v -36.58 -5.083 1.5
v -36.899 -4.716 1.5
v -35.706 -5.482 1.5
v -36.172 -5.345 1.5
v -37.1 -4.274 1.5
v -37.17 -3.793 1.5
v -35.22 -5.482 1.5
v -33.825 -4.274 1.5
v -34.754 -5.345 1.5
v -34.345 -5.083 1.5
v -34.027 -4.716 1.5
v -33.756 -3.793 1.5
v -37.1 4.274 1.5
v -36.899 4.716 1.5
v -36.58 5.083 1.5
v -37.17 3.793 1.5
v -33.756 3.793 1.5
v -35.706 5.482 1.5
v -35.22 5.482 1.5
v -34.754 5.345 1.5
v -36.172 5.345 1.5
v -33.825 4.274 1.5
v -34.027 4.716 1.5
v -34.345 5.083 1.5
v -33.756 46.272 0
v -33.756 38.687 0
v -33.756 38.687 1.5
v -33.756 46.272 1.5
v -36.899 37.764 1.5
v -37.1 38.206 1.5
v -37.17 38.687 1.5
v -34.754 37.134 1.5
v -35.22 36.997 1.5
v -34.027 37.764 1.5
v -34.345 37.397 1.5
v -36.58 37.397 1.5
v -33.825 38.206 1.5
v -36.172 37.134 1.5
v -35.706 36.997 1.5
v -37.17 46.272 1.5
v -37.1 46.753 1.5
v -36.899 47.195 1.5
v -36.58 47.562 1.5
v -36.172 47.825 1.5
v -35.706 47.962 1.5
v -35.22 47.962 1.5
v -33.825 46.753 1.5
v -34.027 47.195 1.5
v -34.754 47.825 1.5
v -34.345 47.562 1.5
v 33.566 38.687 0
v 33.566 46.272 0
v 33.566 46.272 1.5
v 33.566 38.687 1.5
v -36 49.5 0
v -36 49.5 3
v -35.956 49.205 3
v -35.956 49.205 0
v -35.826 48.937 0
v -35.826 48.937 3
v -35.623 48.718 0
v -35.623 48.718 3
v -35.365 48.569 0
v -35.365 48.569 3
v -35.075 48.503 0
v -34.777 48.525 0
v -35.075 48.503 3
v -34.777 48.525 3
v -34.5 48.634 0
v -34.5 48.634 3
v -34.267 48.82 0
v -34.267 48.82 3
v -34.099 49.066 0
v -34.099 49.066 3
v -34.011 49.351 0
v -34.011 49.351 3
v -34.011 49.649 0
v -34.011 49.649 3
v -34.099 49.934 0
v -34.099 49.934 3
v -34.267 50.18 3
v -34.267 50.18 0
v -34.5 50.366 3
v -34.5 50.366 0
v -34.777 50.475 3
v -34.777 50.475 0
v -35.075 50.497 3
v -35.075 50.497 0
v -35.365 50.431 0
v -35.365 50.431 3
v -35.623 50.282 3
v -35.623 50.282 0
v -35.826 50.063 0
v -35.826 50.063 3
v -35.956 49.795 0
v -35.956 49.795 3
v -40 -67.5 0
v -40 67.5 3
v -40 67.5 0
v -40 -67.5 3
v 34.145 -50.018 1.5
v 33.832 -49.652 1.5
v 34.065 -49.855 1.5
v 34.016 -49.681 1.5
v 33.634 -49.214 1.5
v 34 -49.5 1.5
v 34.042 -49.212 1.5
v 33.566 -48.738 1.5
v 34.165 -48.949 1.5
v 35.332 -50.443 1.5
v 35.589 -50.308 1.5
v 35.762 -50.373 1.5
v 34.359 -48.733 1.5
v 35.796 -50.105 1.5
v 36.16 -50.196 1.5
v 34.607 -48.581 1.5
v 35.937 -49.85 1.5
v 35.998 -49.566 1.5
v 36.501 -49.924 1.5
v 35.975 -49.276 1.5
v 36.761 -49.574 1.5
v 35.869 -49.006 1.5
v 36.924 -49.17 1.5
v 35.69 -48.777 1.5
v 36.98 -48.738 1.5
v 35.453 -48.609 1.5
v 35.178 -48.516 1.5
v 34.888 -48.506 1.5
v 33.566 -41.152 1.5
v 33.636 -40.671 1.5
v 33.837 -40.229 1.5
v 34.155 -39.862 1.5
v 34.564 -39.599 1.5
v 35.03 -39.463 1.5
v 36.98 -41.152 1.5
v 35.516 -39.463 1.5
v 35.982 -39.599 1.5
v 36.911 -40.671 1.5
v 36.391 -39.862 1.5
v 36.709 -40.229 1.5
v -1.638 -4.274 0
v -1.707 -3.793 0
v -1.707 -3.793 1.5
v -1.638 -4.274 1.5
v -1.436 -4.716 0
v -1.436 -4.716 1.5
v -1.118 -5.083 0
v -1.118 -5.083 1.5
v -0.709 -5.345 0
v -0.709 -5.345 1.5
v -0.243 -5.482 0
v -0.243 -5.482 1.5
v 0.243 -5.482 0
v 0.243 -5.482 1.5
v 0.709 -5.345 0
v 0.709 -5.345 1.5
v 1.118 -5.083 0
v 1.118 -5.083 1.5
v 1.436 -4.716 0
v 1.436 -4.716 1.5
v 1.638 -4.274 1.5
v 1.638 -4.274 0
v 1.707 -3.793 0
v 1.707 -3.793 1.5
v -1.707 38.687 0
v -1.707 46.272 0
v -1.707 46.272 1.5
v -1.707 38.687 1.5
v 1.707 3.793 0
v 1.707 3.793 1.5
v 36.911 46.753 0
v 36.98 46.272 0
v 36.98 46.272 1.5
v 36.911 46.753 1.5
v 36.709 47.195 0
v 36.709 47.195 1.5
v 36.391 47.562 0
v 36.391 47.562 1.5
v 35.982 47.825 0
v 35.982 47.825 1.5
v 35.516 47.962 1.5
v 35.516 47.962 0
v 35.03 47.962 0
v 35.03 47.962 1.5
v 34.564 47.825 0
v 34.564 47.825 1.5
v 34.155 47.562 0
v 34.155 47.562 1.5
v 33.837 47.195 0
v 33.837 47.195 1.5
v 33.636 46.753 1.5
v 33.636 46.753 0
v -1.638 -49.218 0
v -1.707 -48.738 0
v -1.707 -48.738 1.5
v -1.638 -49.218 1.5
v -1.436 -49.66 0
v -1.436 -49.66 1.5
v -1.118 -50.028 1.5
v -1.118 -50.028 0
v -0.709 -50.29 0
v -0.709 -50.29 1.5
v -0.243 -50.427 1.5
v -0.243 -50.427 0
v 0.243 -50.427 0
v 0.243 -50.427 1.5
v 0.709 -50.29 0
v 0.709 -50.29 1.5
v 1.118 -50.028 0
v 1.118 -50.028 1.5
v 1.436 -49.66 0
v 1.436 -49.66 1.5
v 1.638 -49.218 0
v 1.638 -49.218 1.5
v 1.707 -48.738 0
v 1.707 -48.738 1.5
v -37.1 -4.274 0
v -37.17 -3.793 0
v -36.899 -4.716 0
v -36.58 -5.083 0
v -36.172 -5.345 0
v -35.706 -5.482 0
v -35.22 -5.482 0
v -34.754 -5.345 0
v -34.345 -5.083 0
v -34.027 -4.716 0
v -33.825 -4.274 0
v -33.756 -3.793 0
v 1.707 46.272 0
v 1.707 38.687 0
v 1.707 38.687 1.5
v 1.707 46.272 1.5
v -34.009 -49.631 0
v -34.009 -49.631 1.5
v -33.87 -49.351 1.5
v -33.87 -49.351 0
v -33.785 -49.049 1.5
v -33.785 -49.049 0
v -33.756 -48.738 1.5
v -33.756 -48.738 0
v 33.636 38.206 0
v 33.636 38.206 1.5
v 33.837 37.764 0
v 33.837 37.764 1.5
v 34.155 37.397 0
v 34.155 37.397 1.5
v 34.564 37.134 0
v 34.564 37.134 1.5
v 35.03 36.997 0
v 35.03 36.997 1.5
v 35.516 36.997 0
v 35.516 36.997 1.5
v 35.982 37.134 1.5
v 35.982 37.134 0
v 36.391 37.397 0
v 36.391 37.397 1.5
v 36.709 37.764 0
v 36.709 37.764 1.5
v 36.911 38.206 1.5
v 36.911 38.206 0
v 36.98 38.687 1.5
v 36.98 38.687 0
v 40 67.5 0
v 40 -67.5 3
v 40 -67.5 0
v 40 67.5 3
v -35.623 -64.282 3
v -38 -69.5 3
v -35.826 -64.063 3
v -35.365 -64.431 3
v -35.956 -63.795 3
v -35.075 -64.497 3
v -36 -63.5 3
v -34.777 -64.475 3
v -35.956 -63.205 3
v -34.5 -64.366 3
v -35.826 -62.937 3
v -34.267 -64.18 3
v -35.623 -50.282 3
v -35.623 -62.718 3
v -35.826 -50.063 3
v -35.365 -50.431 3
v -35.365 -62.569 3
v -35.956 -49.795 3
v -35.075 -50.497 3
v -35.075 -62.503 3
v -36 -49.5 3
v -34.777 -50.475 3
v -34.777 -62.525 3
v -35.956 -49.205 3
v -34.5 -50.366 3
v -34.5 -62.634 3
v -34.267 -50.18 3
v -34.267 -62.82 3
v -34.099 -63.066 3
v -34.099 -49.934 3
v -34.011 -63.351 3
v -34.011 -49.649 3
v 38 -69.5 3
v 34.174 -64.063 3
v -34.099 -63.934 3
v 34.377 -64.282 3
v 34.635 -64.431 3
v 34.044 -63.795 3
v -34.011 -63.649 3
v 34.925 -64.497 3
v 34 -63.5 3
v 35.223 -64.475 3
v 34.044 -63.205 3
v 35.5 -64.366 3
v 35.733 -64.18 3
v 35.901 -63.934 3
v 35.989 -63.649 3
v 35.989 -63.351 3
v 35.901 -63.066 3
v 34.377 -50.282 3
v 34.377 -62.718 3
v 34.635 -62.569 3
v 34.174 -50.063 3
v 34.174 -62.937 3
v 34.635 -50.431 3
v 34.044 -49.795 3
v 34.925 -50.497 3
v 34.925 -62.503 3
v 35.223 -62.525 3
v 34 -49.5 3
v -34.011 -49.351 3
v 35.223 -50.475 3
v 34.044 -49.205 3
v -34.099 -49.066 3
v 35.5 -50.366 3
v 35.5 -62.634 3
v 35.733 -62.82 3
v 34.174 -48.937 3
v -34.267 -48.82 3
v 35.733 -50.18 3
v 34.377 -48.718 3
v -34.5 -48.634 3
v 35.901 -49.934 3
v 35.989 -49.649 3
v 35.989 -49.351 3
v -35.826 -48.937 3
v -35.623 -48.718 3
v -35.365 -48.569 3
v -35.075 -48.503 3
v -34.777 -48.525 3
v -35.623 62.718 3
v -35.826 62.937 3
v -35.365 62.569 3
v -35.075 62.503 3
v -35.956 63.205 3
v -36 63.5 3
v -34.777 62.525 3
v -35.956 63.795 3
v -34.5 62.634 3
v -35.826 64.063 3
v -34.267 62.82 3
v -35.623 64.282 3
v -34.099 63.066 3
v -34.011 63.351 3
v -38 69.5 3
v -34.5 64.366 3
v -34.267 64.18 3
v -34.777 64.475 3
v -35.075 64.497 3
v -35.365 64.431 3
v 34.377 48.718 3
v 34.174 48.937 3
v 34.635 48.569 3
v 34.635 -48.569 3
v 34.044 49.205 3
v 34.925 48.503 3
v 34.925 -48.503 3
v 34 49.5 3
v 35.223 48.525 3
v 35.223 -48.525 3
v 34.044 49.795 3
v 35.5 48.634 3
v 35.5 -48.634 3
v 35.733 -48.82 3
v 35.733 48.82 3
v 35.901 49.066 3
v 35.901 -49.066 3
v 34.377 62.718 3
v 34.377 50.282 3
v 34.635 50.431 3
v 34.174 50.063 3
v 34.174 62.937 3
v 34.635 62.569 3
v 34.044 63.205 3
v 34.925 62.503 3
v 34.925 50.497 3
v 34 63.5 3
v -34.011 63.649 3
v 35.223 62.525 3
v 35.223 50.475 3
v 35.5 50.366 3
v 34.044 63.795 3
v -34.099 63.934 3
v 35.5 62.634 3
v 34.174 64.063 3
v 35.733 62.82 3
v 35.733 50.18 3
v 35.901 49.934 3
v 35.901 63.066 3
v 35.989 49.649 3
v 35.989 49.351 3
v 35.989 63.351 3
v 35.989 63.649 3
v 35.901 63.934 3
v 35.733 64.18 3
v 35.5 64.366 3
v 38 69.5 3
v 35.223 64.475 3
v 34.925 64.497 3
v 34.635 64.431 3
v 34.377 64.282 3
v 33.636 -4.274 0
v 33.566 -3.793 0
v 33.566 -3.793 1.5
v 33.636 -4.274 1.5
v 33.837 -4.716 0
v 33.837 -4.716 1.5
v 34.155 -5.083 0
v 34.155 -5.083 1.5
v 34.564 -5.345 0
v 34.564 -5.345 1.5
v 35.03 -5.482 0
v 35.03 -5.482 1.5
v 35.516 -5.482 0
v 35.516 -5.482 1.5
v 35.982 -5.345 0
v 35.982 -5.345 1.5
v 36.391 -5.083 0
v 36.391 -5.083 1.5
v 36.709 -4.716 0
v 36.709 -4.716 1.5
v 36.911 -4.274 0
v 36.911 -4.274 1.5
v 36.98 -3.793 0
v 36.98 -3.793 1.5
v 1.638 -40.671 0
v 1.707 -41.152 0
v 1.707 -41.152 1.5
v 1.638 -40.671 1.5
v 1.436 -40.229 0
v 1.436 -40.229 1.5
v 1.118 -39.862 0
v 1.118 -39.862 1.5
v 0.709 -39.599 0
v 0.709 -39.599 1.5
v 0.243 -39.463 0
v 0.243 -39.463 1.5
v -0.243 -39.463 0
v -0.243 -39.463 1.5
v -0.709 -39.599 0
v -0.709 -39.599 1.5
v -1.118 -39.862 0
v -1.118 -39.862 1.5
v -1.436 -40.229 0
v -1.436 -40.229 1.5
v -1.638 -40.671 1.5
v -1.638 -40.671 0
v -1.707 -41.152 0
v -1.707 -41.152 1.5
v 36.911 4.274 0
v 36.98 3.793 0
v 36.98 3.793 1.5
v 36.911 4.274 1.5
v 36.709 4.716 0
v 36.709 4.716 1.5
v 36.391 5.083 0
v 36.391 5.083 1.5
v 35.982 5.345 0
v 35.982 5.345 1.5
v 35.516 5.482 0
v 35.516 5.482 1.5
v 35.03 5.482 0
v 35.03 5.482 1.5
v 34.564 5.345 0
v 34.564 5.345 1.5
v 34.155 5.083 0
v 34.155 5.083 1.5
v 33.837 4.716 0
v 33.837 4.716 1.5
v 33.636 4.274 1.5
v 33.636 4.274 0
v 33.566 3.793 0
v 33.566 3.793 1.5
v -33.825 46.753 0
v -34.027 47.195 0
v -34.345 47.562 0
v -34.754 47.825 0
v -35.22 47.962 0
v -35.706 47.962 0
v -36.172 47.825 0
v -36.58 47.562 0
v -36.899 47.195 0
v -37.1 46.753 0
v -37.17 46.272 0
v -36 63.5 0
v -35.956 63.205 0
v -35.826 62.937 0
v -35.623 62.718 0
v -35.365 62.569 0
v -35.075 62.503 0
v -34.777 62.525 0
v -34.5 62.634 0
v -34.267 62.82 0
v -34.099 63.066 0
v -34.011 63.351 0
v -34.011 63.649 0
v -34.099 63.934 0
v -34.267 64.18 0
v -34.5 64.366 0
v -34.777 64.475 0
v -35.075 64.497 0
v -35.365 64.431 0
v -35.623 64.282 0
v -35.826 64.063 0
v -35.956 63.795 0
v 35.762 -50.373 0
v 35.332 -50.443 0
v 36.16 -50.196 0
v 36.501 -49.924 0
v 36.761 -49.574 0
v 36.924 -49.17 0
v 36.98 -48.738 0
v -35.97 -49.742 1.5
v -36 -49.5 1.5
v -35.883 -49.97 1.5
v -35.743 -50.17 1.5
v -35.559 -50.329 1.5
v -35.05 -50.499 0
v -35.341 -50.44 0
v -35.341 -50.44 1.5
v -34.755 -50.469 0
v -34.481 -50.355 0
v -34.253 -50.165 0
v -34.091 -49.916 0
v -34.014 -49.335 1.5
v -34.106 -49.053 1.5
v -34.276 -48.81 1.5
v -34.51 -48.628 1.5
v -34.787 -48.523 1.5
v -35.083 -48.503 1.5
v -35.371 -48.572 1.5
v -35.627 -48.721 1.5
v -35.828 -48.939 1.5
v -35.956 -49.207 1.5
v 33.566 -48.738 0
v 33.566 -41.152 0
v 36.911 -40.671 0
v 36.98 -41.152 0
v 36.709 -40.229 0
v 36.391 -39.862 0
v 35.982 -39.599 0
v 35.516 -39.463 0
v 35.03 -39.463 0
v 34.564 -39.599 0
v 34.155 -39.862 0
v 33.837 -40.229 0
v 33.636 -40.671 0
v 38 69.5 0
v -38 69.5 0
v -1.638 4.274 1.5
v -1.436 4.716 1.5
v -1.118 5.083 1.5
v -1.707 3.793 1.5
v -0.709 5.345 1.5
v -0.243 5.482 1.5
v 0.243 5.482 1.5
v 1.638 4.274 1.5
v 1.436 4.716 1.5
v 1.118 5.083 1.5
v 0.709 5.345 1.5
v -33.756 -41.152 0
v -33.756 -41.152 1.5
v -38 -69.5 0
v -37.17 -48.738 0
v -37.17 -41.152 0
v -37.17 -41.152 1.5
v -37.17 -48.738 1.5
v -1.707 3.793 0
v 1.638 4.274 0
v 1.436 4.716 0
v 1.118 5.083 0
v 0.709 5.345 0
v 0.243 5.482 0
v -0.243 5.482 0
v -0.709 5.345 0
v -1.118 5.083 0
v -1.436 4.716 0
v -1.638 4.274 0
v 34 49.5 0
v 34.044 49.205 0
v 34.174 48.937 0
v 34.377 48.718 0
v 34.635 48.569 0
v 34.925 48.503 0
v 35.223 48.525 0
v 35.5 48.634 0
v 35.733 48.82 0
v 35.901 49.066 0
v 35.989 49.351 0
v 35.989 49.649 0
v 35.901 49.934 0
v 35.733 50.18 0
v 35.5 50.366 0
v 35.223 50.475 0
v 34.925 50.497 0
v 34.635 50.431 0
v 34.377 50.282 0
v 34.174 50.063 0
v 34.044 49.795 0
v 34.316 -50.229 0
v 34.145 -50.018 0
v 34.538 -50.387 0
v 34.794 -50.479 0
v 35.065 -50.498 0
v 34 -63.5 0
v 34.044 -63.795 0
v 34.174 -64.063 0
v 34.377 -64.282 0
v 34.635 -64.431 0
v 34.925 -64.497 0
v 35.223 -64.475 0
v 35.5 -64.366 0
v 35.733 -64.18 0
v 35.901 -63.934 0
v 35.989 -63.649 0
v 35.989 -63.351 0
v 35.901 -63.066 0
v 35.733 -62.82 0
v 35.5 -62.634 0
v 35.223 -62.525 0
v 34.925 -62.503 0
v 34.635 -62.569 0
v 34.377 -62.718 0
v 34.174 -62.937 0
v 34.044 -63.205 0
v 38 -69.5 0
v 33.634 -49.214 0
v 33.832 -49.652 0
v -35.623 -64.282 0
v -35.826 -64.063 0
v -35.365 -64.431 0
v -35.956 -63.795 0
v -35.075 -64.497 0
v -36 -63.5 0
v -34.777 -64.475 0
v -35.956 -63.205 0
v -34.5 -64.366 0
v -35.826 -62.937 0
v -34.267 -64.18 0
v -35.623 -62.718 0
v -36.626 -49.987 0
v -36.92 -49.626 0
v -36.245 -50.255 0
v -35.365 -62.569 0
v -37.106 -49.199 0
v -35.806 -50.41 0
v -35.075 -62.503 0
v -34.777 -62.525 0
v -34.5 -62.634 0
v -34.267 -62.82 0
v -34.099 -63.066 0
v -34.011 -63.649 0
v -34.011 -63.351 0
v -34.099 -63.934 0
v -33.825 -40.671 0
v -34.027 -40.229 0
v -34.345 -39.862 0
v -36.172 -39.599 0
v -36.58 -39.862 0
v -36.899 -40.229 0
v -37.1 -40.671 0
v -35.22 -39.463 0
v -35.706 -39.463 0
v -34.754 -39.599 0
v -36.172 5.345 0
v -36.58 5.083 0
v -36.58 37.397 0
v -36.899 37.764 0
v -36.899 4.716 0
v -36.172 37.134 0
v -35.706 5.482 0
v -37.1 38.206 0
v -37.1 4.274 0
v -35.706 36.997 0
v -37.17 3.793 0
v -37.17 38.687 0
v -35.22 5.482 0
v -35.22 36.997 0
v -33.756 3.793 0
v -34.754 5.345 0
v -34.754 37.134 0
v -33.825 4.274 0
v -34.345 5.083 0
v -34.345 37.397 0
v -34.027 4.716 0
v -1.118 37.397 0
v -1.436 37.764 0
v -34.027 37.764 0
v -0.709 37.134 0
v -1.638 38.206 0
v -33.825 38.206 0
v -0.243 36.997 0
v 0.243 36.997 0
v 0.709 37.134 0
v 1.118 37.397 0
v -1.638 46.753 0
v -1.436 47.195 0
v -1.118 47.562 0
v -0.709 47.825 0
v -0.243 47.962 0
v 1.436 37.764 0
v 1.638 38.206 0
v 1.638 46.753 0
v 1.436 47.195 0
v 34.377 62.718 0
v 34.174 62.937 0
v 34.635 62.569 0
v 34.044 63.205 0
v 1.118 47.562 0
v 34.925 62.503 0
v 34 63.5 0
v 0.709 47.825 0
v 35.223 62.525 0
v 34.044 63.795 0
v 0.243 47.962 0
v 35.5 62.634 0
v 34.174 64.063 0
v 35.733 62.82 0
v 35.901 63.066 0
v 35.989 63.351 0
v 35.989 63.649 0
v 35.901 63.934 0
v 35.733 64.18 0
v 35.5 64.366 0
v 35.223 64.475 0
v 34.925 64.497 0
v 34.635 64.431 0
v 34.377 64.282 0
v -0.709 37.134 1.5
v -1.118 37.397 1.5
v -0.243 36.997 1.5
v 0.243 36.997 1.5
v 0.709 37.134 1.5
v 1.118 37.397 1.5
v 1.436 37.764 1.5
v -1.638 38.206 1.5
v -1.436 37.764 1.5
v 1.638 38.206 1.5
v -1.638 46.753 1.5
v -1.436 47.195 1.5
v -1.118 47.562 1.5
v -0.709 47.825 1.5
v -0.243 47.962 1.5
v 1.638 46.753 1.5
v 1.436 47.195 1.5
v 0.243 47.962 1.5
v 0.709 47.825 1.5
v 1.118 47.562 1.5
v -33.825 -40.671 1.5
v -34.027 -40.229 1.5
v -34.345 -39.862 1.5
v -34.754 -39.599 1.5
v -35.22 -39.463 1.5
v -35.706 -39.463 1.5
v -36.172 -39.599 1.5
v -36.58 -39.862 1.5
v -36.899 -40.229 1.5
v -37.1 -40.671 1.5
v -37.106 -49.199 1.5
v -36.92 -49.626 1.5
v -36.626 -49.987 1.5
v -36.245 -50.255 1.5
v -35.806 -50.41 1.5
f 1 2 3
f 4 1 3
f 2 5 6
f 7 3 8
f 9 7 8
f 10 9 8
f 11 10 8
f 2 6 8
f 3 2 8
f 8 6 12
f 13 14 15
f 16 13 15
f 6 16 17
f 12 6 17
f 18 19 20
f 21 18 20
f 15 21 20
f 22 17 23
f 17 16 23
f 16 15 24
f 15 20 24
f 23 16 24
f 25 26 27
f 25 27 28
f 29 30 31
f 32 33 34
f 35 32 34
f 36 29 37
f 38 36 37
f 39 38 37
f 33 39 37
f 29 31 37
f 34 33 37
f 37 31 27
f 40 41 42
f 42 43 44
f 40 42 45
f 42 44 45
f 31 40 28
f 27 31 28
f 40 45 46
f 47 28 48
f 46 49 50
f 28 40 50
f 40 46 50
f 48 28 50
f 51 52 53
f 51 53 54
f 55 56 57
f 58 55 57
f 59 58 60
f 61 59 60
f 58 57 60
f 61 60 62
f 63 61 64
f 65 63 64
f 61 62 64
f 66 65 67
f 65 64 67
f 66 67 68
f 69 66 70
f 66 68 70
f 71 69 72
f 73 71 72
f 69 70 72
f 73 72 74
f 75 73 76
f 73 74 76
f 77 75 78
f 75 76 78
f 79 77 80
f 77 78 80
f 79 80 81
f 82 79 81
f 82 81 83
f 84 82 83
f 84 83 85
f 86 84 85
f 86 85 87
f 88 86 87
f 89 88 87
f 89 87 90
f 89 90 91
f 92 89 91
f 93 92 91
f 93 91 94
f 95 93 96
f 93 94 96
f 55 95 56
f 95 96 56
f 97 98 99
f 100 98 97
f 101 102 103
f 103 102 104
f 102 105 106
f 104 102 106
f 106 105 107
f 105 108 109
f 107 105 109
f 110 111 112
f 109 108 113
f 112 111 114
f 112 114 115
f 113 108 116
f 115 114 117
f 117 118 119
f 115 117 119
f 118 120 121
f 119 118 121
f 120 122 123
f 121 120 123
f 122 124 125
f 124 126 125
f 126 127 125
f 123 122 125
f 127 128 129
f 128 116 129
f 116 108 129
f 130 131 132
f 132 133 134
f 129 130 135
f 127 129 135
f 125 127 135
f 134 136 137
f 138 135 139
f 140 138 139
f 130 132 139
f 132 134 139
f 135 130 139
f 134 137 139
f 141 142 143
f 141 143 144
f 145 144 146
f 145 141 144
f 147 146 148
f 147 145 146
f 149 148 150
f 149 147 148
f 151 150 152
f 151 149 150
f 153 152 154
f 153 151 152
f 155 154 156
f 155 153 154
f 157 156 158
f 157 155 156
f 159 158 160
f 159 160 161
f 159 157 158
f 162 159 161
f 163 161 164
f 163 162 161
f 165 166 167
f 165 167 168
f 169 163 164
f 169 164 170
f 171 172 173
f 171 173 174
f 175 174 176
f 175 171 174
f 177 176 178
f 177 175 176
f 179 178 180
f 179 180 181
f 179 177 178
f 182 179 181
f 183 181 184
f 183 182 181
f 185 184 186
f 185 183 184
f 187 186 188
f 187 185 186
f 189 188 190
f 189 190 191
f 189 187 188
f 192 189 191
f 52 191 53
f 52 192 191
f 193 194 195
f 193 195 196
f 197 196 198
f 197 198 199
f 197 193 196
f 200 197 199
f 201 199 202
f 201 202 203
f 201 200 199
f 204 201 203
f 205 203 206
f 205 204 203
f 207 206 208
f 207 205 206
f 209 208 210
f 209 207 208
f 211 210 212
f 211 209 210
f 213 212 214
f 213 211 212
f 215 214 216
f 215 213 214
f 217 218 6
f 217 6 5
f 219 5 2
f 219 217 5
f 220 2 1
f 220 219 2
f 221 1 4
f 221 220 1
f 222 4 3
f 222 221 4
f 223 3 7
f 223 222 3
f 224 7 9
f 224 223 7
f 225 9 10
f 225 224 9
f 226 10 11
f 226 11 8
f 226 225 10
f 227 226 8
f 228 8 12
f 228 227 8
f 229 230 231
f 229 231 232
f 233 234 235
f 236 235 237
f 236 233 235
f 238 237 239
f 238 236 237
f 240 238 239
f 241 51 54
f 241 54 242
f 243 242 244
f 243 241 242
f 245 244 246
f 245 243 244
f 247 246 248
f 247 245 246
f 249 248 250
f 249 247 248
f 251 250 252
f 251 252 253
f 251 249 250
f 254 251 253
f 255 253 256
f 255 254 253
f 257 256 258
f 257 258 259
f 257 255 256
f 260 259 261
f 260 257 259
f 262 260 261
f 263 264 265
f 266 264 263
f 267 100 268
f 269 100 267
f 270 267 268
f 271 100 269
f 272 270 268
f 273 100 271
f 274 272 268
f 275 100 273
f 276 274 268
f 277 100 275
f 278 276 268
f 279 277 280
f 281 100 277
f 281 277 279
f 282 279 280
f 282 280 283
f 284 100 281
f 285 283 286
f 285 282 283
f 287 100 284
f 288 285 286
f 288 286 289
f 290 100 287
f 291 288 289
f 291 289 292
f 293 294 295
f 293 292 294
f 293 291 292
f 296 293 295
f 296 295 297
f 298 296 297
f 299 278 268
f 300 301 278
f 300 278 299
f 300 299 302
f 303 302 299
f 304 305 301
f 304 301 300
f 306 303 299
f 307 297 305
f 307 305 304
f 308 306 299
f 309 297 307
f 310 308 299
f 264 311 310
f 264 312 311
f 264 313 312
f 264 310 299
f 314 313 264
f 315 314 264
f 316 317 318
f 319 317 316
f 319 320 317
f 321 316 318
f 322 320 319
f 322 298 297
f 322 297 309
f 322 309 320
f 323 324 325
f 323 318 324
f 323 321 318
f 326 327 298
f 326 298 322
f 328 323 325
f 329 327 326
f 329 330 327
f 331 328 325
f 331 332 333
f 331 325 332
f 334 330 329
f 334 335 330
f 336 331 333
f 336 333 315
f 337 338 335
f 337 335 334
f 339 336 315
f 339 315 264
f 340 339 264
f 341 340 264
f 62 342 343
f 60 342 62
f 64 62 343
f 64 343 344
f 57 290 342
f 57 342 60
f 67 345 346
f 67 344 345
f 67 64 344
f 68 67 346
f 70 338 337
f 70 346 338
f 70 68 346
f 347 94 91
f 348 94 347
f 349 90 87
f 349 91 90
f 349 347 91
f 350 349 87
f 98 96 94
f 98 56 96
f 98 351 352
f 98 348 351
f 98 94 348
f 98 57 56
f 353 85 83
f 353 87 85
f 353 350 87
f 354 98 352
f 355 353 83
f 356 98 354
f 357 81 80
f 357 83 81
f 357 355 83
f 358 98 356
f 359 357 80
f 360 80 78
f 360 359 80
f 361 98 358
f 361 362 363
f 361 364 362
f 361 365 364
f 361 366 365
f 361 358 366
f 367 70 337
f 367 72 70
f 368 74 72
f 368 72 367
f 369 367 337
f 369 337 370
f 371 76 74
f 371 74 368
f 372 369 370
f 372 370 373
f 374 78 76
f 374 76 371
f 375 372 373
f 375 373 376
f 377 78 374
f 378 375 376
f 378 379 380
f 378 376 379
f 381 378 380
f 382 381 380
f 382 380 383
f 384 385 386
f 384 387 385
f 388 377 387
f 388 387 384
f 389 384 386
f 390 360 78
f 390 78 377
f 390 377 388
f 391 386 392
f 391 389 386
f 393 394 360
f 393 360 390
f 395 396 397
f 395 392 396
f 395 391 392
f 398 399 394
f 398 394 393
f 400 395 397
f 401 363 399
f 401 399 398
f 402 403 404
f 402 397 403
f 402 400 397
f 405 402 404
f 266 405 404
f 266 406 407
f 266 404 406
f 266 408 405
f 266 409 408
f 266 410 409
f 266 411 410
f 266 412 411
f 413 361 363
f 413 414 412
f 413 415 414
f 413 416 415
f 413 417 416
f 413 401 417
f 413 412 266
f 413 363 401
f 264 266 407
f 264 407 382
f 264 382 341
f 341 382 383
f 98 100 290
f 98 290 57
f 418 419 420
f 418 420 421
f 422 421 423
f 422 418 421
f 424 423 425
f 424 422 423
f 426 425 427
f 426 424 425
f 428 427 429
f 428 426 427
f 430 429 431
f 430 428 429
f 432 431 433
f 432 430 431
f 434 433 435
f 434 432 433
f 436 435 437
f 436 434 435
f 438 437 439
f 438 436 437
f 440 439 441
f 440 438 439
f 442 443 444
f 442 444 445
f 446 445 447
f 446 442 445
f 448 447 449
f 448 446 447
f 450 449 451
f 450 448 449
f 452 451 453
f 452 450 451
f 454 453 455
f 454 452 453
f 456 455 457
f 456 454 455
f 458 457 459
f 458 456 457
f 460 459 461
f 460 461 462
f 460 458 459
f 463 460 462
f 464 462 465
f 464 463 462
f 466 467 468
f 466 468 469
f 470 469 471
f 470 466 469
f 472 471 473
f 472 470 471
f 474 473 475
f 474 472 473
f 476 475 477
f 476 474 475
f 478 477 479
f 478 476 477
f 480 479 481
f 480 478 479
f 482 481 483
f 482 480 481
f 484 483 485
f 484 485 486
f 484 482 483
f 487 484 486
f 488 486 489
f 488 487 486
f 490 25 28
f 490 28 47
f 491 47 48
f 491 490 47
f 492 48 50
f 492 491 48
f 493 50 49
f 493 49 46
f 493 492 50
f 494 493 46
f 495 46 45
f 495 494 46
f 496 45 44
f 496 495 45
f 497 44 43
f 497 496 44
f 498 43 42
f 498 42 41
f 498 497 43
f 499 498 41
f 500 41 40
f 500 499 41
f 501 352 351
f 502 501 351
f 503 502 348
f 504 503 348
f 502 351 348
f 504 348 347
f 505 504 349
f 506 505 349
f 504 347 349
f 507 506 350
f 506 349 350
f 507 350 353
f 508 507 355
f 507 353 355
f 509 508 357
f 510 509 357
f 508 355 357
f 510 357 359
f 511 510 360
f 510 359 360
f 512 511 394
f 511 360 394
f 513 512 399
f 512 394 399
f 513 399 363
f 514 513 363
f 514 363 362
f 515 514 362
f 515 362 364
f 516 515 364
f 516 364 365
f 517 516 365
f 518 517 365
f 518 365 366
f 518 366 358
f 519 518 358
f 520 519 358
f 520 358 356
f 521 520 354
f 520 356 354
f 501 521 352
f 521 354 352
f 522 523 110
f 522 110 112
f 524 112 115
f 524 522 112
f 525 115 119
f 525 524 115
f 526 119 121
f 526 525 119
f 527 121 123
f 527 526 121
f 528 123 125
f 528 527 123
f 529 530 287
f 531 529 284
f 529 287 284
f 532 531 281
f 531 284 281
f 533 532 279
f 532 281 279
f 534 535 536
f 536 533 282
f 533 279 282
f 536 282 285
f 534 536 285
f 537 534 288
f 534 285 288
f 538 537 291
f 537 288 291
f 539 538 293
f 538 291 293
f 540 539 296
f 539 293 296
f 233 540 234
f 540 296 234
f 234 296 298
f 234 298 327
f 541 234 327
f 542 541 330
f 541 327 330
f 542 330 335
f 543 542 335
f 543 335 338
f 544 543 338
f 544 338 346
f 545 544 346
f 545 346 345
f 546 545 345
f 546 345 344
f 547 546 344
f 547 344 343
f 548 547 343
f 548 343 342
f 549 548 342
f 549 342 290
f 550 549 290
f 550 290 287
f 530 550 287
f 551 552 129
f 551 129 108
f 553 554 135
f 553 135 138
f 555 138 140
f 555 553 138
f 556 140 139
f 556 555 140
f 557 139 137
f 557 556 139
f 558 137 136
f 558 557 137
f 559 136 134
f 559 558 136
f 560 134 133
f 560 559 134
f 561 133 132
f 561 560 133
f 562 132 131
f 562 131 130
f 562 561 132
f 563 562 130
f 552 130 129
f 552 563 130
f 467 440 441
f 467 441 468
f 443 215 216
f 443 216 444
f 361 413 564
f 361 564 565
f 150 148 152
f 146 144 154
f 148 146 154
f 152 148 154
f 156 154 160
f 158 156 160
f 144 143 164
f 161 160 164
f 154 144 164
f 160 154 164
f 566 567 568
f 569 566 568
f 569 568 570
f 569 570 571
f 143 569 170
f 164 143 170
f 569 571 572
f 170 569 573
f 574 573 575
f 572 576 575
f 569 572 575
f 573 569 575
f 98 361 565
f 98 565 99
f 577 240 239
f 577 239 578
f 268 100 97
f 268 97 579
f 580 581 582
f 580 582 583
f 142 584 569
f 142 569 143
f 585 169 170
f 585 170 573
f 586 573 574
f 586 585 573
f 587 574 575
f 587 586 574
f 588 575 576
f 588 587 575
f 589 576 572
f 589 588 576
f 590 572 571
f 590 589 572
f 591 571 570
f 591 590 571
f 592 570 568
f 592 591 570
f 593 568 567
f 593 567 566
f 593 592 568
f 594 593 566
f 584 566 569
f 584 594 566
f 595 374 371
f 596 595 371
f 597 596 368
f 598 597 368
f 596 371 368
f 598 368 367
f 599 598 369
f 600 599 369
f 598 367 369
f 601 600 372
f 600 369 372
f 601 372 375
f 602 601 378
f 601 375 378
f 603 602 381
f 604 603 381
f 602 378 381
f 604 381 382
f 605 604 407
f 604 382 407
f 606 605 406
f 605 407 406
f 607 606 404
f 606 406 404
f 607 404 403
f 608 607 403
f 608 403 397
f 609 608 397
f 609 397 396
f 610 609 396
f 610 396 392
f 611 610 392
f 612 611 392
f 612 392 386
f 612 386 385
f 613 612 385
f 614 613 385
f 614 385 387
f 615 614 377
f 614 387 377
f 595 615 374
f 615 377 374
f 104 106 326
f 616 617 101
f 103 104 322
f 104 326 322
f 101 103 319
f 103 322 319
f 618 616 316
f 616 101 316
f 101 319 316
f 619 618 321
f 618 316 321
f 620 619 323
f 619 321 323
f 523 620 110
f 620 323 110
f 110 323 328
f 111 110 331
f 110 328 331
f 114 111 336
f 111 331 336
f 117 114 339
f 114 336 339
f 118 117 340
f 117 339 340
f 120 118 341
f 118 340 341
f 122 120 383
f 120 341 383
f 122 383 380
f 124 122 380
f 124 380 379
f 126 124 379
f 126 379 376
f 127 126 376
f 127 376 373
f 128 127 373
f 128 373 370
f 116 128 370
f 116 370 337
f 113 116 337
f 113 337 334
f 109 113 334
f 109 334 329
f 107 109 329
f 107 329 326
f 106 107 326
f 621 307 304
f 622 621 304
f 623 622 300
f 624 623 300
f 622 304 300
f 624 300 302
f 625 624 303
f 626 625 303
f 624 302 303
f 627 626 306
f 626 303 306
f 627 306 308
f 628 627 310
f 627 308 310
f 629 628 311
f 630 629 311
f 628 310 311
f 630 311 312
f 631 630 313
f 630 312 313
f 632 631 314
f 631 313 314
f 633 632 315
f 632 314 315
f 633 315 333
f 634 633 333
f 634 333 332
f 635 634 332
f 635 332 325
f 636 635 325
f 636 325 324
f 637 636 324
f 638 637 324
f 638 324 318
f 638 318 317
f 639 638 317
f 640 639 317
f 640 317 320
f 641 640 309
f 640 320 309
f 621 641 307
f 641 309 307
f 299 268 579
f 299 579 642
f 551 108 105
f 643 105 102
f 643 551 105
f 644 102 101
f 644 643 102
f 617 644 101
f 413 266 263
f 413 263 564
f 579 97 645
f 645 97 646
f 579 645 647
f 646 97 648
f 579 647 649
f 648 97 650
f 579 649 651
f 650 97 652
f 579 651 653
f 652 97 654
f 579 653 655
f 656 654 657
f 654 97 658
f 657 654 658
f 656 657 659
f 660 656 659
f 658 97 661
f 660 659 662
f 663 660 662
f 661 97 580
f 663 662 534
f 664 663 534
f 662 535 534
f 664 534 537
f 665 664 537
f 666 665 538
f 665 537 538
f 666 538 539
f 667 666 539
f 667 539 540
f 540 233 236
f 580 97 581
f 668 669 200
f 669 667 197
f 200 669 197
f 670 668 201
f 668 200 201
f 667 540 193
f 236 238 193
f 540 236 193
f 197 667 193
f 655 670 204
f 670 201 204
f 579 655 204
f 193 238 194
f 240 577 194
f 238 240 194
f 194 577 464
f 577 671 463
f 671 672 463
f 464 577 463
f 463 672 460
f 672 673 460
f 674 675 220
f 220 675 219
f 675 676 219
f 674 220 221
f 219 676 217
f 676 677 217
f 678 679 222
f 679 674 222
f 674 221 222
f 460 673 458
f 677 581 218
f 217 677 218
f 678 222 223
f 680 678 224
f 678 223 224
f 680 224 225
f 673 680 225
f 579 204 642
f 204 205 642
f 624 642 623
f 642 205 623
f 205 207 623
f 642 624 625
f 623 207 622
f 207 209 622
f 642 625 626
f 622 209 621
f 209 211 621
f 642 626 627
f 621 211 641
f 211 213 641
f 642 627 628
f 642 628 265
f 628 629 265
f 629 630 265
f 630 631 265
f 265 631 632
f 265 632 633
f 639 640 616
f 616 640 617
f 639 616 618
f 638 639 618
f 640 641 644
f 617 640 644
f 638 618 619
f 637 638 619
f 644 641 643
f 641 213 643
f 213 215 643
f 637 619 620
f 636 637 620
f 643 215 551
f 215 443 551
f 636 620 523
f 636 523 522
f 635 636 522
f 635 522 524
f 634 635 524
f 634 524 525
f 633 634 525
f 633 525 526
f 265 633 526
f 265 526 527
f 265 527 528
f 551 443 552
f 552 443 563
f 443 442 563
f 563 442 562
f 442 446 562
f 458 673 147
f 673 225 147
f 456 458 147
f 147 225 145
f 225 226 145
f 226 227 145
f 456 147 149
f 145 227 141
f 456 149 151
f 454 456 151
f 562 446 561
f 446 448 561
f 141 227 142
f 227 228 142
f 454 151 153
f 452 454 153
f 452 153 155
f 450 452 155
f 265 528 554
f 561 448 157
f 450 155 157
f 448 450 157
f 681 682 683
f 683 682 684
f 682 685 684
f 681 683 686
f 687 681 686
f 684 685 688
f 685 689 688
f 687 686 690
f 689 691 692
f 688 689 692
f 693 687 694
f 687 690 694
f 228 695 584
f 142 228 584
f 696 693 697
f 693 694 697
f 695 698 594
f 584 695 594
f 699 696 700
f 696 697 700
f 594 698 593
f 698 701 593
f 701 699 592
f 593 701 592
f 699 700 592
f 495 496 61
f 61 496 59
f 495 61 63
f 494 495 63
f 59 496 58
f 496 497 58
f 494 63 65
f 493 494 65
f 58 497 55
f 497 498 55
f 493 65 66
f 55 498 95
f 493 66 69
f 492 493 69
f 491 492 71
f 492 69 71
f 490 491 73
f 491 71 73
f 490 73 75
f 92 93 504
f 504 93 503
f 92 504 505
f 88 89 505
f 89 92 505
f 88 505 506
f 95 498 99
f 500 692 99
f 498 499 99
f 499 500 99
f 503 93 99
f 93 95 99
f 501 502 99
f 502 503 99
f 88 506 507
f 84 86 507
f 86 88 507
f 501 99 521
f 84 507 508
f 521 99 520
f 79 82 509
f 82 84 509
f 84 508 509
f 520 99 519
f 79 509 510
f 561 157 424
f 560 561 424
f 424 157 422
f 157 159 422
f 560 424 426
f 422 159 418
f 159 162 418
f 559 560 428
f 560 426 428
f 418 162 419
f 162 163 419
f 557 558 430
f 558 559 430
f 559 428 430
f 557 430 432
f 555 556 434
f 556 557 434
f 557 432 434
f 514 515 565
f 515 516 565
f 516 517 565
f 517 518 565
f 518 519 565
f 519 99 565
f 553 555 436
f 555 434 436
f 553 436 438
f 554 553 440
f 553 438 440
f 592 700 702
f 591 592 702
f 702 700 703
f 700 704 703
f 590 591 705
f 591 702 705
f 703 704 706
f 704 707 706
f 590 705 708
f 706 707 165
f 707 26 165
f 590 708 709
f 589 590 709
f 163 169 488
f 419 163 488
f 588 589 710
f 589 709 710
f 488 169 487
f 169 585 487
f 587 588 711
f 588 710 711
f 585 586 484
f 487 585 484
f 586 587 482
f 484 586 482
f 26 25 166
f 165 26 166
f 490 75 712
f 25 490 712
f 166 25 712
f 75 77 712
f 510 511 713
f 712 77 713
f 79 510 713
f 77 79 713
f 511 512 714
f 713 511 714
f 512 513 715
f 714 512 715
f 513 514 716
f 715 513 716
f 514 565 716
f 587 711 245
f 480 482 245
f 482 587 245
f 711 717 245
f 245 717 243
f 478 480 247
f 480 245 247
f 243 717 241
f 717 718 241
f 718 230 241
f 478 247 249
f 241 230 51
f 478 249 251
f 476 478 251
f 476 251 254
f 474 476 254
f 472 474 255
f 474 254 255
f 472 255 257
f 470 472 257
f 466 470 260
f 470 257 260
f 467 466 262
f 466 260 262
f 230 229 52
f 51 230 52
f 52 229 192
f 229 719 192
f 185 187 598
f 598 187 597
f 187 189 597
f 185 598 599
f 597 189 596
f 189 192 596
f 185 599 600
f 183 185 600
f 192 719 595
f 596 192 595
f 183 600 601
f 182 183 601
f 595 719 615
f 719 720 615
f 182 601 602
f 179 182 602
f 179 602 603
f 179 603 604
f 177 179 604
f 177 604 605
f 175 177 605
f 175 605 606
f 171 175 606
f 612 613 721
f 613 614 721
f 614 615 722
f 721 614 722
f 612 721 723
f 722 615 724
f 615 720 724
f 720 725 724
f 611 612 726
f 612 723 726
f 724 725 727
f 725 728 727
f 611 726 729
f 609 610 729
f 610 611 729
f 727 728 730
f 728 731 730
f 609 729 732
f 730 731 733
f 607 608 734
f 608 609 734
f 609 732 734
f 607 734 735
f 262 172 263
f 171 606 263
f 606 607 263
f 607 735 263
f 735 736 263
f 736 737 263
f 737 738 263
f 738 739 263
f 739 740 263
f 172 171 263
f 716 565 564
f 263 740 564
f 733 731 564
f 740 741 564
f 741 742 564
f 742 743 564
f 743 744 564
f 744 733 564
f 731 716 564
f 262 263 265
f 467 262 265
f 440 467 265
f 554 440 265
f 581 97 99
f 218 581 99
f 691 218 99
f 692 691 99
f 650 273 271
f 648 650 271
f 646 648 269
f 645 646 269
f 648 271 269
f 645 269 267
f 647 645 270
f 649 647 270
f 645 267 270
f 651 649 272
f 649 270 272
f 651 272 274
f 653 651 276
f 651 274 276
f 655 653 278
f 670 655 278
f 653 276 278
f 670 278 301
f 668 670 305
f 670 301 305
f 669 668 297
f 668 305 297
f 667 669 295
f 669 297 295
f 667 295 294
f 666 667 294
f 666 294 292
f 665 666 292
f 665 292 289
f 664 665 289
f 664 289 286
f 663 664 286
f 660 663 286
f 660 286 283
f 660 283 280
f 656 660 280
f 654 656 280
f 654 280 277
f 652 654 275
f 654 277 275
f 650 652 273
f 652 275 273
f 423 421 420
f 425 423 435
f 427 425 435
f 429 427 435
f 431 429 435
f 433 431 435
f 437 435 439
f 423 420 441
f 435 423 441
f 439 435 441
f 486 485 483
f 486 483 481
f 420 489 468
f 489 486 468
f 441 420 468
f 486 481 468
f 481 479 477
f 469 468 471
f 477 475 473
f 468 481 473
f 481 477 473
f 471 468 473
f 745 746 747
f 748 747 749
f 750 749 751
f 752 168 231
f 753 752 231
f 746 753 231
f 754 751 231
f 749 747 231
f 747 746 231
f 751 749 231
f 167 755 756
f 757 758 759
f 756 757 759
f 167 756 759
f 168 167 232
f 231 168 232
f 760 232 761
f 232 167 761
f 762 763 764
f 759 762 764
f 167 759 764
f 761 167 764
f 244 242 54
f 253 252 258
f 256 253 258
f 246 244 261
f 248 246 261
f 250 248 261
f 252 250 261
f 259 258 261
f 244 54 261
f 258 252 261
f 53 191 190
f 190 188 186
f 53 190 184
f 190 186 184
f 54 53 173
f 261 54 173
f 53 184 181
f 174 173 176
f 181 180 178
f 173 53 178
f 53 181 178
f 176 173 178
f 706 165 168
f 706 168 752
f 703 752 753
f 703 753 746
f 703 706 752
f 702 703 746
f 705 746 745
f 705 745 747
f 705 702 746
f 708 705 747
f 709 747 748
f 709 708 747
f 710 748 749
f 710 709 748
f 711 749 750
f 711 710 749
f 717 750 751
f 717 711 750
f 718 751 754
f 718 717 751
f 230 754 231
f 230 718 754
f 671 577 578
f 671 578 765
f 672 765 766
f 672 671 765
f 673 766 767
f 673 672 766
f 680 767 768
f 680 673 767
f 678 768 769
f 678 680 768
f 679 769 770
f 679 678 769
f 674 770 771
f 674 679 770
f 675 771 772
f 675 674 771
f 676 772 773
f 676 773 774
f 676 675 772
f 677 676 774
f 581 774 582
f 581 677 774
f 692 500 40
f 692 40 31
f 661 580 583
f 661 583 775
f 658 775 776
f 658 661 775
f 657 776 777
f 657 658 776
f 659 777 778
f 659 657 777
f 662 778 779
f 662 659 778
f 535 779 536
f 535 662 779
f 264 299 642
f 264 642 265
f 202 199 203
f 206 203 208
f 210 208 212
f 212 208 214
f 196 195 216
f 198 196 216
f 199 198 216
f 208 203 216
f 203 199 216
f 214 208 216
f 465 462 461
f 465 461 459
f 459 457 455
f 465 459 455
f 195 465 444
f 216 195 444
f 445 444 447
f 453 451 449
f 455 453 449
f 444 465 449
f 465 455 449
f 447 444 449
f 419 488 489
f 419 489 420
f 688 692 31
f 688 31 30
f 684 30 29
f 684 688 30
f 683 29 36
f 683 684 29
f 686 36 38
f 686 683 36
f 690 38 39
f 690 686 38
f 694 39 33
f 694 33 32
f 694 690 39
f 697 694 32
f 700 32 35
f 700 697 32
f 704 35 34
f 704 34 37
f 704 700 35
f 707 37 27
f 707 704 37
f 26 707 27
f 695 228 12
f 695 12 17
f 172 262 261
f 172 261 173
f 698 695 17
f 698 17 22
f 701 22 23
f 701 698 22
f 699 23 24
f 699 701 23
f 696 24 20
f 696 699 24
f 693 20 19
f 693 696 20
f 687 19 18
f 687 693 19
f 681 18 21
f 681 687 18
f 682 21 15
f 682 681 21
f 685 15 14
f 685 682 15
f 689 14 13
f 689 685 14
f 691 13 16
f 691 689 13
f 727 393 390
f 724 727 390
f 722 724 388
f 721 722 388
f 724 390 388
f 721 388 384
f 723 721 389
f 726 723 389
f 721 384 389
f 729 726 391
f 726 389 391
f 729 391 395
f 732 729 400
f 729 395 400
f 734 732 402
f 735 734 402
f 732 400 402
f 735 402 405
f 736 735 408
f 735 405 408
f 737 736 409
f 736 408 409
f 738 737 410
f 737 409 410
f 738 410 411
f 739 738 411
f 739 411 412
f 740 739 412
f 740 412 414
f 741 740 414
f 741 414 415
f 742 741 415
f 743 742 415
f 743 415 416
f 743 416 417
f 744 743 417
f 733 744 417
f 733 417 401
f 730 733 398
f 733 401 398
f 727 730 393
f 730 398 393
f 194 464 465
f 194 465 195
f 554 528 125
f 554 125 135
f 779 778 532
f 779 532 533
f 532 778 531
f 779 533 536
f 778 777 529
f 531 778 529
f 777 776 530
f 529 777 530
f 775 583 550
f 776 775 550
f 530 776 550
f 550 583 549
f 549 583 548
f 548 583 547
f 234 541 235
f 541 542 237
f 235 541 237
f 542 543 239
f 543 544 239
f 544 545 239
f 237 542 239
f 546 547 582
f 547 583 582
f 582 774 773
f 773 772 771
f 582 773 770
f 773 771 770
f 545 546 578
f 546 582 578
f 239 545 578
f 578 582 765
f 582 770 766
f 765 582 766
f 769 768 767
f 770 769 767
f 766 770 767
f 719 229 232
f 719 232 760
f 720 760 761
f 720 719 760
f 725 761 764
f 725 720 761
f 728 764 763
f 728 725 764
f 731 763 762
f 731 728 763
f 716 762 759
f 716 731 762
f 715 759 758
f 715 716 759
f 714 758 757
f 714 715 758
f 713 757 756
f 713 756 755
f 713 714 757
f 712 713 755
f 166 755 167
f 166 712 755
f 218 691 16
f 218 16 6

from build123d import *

# Parameters (mm, degrees)
SKETCH1_R           = 1
BOSS_EXTRUDE1_DEPTH = 3
CUT_EXTRUDE4_DEPTH  = 1.5


with BuildPart() as part:
    # Sketch1 → Boss-Extrude1 (new body)
    with BuildSketch(Plane.XY.offset(3)):
        Polygon((-38, -69.5), (38, -69.5), (40, -67.5), (40, 67.5), (38, 69.5), (-38, 69.5), (-40, 67.5), (-40, -67.5), align=None)
        with Locations(Location((35, 49.5, 0), (0, 0, 180))):
            Circle(SKETCH1_R, mode=Mode.SUBTRACT)
        with Locations(Location((-35, -63.5, 0), (0, 0, 180))):
            Circle(SKETCH1_R, mode=Mode.SUBTRACT)
        with Locations(Location((35, 63.5, 0), (0, 0, 180))):
            Circle(SKETCH1_R, mode=Mode.SUBTRACT)
        with Locations(Location((-35, -49.5, 0), (0, 0, 180))):
            Circle(SKETCH1_R, mode=Mode.SUBTRACT)
        with Locations(Location((-35, 49.5, 0), (0, 0, 180))):
            Circle(SKETCH1_R, mode=Mode.SUBTRACT)
        with Locations(Location((-35, 63.5, 0), (0, 0, 180))):
            Circle(SKETCH1_R, mode=Mode.SUBTRACT)
        with Locations(Location((35, -49.5, 0), (0, 0, 180))):
            Circle(SKETCH1_R, mode=Mode.SUBTRACT)
        with Locations(Location((35, -63.5, 0), (0, 0, 180))):
            Circle(SKETCH1_R, mode=Mode.SUBTRACT)
    extrude(amount=-BOSS_EXTRUDE1_DEPTH)

    # Sketch2 → Cut-Extrude4 (cut)
    with BuildSketch(Plane(origin=(0, 0, 0), x_dir=(-1, 0, 0), z_dir=(0, 0, -1))):
        with BuildLine():
            Line((1.706764898, 46.272292783), (1.706764898, 38.686671015))
            ThreePointArc((1.706764898, 38.686671015), (0, 36.979906118), (-1.706764898, 38.686671015))
            Line((-1.706764898, 38.686671015), (-1.706764898, 46.272292783))
            ThreePointArc((-1.706764898, 46.272292783), (0, 47.979057681), (1.706764898, 46.272292783))
        make_face()
        with BuildLine():
            Line((1.706764898, 3.792810884), (1.706764898, -3.792810884))
            ThreePointArc((1.706764898, -3.792810884), (0, -5.499575782), (-1.706764898, -3.792810884))
            Line((-1.706764898, -3.792810884), (-1.706764898, 3.792810884))
            ThreePointArc((-1.706764898, 3.792810884), (0, 5.499575782), (1.706764898, 3.792810884))
        make_face()
        with BuildLine():
            Line((-33.566376322, 46.272292783), (-33.566376322, 38.686671015))
            ThreePointArc((-33.566376322, 38.686671015), (-35.27314122, 36.979906118), (-36.979906118, 38.686671015))
            Line((-36.979906118, 38.686671015), (-36.979906118, 46.272292783))
            ThreePointArc((-36.979906118, 46.272292783), (-35.27314122, 47.979057681), (-33.566376322, 46.272292783))
        make_face()
        with BuildLine():
            Line((37.169546662, 46.272292783), (37.169546662, 38.686671015))
            ThreePointArc((37.169546662, 38.686671015), (35.462781764, 36.979906118), (33.756016866, 38.686671015))
            Line((33.756016866, 38.686671015), (33.756016866, 46.272292783))
            ThreePointArc((33.756016866, 46.272292783), (35.462781764, 47.979057681), (37.169546662, 46.272292783))
        make_face()
        with BuildLine():
            Line((1.706764898, -41.15199809), (1.706764898, -48.737619858))
            ThreePointArc((1.706764898, -48.737619858), (0, -50.444384755), (-1.706764898, -48.737619858))
            Line((-1.706764898, -48.737619858), (-1.706764898, -41.15199809))
            ThreePointArc((-1.706764898, -41.15199809), (0, -39.445233192), (1.706764898, -41.15199809))
        make_face()
        with BuildLine():
            Line((-33.566376322, -41.15199809), (-33.566376322, -48.737619858))
            ThreePointArc((-33.566376322, -48.737619858), (-35.27314122, -50.444384755), (-36.979906118, -48.737619858))
            Line((-36.979906118, -48.737619858), (-36.979906118, -41.15199809))
            ThreePointArc((-36.979906118, -41.15199809), (-35.27314122, -39.445233192), (-33.566376322, -41.15199809))
        make_face()
        with BuildLine():
            Line((-33.566376322, 3.792810884), (-33.566376322, -3.792810884))
            ThreePointArc((-33.566376322, -3.792810884), (-35.27314122, -5.499575782), (-36.979906118, -3.792810884))
            Line((-36.979906118, -3.792810884), (-36.979906118, 3.792810884))
            ThreePointArc((-36.979906118, 3.792810884), (-35.27314122, 5.499575782), (-33.566376322, 3.792810884))
        make_face()
        with BuildLine():
            Line((37.169546662, -41.15199809), (37.169546662, -48.737619858))
            ThreePointArc((37.169546662, -48.737619858), (35.462781764, -50.444384755), (33.756016866, -48.737619858))
            Line((33.756016866, -48.737619858), (33.756016866, -41.15199809))
            ThreePointArc((33.756016866, -41.15199809), (35.462781764, -39.445233192), (37.169546662, -41.15199809))
        make_face()
        with BuildLine():
            Line((37.169546662, 3.792810884), (37.169546662, -3.792810884))
            ThreePointArc((37.169546662, -3.792810884), (35.462781764, -5.499575782), (33.756016866, -3.792810884))
            Line((33.756016866, -3.792810884), (33.756016866, 3.792810884))
            ThreePointArc((33.756016866, 3.792810884), (35.462781764, 5.499575782), (37.169546662, 3.792810884))
        make_face()
    extrude(amount=-CUT_EXTRUDE4_DEPTH, mode=Mode.SUBTRACT)


solid = part.part
